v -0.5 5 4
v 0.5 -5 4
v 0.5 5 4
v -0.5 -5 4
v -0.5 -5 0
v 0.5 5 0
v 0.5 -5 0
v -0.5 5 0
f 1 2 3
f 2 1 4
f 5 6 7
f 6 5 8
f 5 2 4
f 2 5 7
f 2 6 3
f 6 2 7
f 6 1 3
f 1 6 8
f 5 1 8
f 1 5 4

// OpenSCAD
module createWall(wall_x, wall_y, wall_z) {
    translate([0,0, wall_z / 2])
    cube([wall_x, wall_y, wall_z], center = true);
}
createWall(wall_x=1,wall_y=10,wall_z=4);
